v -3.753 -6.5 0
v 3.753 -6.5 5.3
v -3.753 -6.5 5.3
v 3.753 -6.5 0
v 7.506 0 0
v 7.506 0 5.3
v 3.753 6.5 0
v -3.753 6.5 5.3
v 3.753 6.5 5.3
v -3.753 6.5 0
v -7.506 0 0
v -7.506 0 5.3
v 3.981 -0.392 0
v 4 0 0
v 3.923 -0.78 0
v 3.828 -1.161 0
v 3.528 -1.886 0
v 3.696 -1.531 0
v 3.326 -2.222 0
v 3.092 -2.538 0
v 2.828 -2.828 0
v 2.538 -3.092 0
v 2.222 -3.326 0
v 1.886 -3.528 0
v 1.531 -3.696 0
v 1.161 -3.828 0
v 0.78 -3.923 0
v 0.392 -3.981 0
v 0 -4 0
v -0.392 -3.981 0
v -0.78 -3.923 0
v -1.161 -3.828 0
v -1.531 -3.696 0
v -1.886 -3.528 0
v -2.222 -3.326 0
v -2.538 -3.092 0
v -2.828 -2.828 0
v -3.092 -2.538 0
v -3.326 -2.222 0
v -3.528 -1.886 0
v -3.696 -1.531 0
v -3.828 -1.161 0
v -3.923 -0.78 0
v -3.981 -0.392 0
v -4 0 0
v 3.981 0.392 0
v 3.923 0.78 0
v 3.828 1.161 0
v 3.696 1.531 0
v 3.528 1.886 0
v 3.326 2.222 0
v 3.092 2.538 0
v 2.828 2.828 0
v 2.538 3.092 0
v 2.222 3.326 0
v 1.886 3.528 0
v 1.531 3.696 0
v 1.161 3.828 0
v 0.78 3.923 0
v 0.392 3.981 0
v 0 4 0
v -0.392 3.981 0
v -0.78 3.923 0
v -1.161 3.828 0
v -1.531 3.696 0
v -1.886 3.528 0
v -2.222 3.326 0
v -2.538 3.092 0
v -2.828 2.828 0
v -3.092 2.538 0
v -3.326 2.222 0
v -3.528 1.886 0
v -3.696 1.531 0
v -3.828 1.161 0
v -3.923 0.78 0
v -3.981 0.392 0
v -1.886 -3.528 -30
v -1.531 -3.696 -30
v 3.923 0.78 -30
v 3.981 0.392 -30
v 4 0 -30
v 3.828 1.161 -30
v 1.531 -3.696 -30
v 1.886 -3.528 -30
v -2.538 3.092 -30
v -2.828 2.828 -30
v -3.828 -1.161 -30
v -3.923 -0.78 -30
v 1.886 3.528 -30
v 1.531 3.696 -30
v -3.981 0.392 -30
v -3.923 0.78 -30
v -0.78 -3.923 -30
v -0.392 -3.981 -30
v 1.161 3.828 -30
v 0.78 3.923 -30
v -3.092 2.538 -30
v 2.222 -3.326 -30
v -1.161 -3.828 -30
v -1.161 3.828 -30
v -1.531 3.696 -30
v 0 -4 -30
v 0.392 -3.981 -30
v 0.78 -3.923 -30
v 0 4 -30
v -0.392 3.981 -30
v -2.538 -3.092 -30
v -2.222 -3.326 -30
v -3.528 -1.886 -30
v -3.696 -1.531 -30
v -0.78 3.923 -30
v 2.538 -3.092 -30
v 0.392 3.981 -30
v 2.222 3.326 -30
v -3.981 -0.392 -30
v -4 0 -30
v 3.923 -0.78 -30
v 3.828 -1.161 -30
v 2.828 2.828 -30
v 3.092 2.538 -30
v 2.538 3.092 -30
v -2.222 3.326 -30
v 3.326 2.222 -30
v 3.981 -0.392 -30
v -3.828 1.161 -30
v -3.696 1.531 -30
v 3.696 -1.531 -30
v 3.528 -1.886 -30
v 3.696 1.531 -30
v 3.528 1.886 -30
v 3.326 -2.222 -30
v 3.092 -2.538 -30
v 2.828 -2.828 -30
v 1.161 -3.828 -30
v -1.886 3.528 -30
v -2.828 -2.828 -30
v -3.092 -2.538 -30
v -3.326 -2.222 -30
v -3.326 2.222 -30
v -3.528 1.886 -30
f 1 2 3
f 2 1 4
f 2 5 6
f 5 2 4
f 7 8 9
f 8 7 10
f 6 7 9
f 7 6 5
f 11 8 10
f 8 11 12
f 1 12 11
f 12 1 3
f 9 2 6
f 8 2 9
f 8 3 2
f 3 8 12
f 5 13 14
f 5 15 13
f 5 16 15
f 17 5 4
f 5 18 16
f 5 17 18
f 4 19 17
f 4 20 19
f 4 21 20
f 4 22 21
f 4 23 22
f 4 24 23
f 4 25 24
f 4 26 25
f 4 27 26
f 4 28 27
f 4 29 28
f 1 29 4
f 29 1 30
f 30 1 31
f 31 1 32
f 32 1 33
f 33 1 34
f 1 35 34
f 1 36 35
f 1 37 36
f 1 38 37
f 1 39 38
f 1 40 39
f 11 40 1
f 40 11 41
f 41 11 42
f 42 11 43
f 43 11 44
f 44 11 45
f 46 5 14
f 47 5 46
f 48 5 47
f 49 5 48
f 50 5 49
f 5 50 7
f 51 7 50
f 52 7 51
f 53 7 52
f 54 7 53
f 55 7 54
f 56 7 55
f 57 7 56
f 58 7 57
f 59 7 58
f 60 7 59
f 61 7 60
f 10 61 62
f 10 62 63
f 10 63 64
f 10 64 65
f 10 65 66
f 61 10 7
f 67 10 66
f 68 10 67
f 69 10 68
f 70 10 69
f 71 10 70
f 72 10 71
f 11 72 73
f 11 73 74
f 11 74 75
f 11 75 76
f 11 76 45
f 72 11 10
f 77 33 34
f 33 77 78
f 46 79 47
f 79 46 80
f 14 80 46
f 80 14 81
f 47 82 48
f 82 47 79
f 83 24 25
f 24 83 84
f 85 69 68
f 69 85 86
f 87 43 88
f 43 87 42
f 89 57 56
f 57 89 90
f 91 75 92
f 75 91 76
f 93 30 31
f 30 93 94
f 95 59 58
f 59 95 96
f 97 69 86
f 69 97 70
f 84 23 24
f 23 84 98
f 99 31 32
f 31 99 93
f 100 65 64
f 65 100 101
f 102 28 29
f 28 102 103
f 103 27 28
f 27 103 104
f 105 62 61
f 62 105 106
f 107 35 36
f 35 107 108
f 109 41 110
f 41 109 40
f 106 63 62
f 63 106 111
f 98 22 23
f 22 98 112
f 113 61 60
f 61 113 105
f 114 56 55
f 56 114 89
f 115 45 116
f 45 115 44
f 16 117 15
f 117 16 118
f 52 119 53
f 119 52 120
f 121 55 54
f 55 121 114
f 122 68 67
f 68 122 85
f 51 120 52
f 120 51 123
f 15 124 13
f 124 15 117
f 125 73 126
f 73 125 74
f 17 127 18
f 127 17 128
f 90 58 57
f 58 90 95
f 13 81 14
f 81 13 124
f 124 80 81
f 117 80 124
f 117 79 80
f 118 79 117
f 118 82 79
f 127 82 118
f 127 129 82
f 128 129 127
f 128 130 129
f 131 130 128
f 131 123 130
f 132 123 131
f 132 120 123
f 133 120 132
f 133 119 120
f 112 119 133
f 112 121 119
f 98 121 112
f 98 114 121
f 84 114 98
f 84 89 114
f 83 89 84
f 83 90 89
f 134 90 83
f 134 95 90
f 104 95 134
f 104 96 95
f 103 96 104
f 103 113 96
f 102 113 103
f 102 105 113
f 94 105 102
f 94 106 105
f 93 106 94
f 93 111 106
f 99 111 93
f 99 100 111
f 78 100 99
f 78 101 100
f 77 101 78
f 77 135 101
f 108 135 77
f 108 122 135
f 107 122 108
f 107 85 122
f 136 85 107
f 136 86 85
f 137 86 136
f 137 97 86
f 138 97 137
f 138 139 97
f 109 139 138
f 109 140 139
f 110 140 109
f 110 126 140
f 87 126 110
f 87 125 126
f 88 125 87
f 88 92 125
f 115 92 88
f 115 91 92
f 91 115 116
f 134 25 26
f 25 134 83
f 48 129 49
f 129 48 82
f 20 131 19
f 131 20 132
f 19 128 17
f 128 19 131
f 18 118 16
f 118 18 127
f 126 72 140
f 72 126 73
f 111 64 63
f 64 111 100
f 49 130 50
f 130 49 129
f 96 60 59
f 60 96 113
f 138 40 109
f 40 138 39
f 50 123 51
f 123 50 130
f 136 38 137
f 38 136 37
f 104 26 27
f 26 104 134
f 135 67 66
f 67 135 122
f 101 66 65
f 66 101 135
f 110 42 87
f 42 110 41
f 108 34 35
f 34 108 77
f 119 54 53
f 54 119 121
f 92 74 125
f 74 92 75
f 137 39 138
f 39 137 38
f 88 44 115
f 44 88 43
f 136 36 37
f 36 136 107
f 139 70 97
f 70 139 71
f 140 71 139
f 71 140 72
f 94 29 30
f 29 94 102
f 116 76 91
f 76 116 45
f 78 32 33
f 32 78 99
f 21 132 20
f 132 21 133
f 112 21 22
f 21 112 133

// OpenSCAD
// M8 六角ボルト（ねじ山省略）

across_flats = 13;
head_height  = 5.3;
shank_diameter = 8;
shank_length   = 30;

// 六角形の外接円半径: 対辺距離 / √3
head_radius = across_flats / sqrt(3);

union() {
    // 頭部：底面が z=0、+Z 方向へ配置
    cylinder(
        h = head_height,
        r = head_radius,
        $fn = 6
    );

    // シャンク：頭部底面から -Z 方向へ配置
    translate([0, 0, -shank_length])
        cylinder(
            h = shank_length,
            d = shank_diameter,
            $fn = 64
        );
}
